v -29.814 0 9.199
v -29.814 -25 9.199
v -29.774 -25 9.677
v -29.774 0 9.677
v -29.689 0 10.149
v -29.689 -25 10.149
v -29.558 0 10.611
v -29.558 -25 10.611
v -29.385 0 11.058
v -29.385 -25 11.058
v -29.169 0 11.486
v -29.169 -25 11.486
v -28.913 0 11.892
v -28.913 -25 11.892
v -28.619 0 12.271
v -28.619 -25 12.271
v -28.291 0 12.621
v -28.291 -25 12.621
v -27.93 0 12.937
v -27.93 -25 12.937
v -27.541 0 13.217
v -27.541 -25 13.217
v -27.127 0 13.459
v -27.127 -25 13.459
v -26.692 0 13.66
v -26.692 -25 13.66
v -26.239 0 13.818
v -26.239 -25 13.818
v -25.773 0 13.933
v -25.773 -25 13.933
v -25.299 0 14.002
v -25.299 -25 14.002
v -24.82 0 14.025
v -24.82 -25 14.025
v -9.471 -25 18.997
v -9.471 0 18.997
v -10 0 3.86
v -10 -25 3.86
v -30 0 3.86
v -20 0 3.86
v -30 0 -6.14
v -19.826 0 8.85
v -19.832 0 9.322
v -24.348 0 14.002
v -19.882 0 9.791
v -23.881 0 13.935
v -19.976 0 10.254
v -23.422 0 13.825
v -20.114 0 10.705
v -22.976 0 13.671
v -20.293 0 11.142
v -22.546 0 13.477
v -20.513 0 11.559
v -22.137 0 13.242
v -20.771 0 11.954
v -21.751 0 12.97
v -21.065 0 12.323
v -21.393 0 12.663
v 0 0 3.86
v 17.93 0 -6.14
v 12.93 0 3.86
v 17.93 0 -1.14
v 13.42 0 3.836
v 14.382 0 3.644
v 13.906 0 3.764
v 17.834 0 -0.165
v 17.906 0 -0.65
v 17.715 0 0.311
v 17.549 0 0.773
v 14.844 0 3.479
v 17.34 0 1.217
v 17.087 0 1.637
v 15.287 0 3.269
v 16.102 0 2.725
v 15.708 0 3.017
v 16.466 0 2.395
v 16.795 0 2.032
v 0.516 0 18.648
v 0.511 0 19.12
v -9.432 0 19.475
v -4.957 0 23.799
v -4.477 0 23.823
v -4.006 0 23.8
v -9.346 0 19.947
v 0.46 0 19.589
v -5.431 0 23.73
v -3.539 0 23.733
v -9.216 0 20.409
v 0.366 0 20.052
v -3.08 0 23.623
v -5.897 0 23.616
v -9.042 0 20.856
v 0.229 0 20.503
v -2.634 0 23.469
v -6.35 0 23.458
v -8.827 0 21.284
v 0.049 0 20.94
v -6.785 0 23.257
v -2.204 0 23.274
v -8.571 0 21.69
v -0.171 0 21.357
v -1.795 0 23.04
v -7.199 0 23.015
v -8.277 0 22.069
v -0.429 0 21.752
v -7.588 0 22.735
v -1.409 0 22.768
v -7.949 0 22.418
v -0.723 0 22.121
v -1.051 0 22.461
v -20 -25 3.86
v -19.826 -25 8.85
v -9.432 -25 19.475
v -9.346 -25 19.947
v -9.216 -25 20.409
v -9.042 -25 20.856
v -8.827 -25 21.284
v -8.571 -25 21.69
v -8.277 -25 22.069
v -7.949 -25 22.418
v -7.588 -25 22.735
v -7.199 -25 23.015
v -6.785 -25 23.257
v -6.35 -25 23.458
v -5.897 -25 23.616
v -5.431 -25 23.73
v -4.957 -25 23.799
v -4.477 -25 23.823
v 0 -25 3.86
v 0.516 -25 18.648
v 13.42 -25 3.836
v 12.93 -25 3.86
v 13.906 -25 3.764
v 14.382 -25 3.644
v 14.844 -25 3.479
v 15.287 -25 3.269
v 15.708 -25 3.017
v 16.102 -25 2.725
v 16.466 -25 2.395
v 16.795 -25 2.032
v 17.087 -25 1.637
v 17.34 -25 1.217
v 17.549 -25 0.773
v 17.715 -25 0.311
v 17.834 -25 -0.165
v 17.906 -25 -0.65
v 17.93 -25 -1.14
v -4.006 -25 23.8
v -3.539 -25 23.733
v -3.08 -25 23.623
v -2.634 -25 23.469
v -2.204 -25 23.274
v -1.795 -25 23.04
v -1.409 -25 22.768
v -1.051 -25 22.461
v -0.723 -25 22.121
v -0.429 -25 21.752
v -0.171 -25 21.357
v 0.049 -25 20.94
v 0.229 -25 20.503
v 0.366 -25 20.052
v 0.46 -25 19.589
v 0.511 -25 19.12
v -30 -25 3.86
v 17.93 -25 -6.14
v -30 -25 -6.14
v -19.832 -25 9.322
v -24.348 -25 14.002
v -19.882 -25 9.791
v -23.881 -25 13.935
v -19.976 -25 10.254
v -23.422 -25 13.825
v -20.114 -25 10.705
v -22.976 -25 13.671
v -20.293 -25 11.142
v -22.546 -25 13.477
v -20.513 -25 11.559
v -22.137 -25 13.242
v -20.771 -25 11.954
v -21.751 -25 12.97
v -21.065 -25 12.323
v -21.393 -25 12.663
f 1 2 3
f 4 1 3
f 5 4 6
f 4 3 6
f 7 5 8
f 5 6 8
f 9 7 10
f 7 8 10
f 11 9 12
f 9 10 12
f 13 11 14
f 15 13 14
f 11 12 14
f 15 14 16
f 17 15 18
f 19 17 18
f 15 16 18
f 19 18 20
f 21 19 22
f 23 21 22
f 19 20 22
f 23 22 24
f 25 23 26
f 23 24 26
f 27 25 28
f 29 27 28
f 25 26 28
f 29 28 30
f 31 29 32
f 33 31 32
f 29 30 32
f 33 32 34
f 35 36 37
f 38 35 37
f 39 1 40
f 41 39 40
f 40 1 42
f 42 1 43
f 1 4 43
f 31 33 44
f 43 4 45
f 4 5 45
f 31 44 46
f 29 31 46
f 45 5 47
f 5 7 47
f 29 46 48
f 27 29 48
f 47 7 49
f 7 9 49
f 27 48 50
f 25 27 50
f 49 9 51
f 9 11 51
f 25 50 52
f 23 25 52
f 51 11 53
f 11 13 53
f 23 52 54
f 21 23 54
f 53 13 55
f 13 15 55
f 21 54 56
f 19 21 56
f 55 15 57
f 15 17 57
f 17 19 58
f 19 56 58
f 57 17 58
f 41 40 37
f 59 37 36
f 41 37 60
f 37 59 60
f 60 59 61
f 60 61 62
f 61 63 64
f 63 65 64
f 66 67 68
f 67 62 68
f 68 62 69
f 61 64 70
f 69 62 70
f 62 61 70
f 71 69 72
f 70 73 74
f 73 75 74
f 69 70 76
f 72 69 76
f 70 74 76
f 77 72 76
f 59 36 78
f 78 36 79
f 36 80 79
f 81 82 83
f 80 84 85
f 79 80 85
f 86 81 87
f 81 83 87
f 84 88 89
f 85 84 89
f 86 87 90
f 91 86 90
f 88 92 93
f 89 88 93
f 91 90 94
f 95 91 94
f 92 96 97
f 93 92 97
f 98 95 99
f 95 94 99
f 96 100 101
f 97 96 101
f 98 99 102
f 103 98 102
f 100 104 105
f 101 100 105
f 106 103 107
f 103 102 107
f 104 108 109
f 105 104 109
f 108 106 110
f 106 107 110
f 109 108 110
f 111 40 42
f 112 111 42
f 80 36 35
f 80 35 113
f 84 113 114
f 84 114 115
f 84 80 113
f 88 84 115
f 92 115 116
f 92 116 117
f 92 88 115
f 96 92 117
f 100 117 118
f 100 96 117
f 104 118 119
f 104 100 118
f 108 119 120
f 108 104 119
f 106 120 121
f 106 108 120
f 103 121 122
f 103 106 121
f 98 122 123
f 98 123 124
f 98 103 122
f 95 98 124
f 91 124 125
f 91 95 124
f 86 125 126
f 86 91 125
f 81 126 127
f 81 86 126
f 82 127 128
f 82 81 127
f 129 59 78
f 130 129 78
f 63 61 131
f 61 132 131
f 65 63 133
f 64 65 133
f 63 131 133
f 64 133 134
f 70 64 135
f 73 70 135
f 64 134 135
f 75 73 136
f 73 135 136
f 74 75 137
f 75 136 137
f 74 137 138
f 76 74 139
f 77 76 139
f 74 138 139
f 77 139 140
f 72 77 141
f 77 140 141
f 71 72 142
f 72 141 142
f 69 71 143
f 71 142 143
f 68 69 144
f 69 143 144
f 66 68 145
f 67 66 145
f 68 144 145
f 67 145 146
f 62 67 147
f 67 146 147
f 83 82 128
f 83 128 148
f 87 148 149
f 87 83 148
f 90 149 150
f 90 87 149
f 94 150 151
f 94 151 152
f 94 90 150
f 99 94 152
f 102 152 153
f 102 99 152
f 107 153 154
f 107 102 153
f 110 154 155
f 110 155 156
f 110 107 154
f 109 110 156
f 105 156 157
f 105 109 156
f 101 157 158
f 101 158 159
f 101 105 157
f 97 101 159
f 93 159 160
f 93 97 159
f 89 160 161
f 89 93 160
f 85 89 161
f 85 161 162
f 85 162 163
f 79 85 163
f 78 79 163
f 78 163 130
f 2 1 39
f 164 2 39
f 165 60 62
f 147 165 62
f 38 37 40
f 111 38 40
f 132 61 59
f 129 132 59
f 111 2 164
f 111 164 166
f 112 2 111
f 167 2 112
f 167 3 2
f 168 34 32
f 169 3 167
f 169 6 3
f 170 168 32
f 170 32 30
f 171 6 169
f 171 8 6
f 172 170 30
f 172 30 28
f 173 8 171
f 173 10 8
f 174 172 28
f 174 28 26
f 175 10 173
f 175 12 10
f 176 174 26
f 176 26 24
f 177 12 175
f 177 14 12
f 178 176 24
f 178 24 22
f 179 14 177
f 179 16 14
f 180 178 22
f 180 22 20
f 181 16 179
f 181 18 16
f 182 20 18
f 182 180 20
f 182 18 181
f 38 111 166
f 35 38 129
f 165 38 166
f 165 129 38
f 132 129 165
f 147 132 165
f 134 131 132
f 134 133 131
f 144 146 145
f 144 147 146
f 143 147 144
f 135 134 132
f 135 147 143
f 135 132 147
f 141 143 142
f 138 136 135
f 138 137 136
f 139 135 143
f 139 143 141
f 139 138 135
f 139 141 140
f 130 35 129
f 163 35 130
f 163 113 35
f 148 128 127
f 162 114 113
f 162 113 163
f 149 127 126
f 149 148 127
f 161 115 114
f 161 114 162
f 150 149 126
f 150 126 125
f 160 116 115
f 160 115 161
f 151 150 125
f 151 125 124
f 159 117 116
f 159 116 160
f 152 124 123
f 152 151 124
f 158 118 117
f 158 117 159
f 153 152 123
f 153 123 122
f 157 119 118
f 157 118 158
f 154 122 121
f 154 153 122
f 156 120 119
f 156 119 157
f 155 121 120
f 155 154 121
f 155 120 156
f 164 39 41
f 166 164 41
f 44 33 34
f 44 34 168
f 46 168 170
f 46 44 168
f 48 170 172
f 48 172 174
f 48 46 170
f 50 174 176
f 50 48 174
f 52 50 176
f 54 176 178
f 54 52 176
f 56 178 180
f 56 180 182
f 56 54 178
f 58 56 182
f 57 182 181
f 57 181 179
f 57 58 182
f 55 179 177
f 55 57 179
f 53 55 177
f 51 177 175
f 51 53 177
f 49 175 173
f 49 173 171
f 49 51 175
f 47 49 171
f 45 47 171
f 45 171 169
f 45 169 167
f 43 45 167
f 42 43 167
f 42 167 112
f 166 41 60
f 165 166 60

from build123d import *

# Parameters (mm, degrees)
F1_DEPTH    = 25
F2_R        = 5
F3_T1_DEPTH = 50.8882578448
F3_T3_DEPTH = 49.1422193702
F4_T1_DEPTH = 50.8882578448
F5_R        = 5


# Not quite as in the source:
# - a fillet or chamfer that OpenCascade refuses, or shapes differently, is made with other operations: its cross-section is extruded or revolved along the edge and cut away or added


with BuildPart() as f1:
    # F0 (on Front) → F1 (new body)
    with BuildSketch(Plane.XZ):
        Polygon((-29.6450223361, 14.0248785508), (-30, 3.8596482585), (-20, 3.8596482585), (-19.6450223361, 14.0248785508), align=None)
        Polygon((-20, 3.8596482585), (-30, 3.8596482585), (-30, -6.1403517415), (17.9300867021, -6.1403517415), (17.9300867021, 3.8596482585), (0, 3.8596482585), (-10, 3.8596482585), align=None)
        Polygon((-9.3028735371, 23.8227382193), (-10, 3.8596482585), (0, 3.8596482585), (0.6971264629, 23.8227382193), align=None)
    extrude(amount=F1_DEPTH)

    # F2
    f2_edges = [f1.edges().sort_by_distance(p)[0] for p in [
        (-29.645022, -12.5, 14.024879),
    ]]
    fillet(f2_edges, radius=F2_R)

    # F3: fillet of radius 5 on 2 edges, made by hand

    # F3_s2 → F3_t1 (cut)
    with BuildSketch(Plane.XZ.offset(-12.9441289224)):
        with BuildLine():
            ThreePointArc((-24.8226739051, 14.0248785508), (-21.2259749034, 12.4981704031), (-19.82571977, 8.8503810672))
            Line((-19.82571977, 8.8503810672), (-19.6450223361, 14.0248785508))
            Line((-19.6450223361, 14.0248785508), (-24.8226739051, 14.0248785508))
        make_face()
    extrude(amount=F3_T1_DEPTH, mode=Mode.SUBTRACT)

    # F3_s4 → F3_t3 (cut)
    with BuildSketch(Plane.XZ.offset(-12.0711096851)):
        with BuildLine():
            ThreePointArc((-9.4713837982, 18.9972357029), (-7.9477215154, 22.419437221), (-4.4744296631, 23.8227382193))
            Line((-4.4744296631, 23.8227382193), (-9.3028735371, 23.8227382193))
            Line((-9.3028735371, 23.8227382193), (-9.4713837982, 18.9972357029))
        make_face()
    extrude(amount=F3_T3_DEPTH, mode=Mode.SUBTRACT)

    # F4: fillet of radius 5 on 1 edges, made by hand

    # F4_s2 → F4_t1 (cut)
    with BuildSketch(Plane.XZ.offset(-12.9441289224)):
        with BuildLine():
            ThreePointArc((-4.4805251061, 23.8227382193), (-0.8838261044, 22.2960300716), (0.516429029, 18.6482407358))
            Line((0.516429029, 18.6482407358), (0.6971264629, 23.8227382193))
            Line((0.6971264629, 23.8227382193), (-4.4805251061, 23.8227382193))
        make_face()
    extrude(amount=F4_T1_DEPTH, mode=Mode.SUBTRACT)

    # F5
    f5_edges = [f1.edges().sort_by_distance(p)[0] for p in [
        (17.930087, -12.5, 3.859648),
    ]]
    fillet(f5_edges, radius=F5_R)


solid = f1.part
